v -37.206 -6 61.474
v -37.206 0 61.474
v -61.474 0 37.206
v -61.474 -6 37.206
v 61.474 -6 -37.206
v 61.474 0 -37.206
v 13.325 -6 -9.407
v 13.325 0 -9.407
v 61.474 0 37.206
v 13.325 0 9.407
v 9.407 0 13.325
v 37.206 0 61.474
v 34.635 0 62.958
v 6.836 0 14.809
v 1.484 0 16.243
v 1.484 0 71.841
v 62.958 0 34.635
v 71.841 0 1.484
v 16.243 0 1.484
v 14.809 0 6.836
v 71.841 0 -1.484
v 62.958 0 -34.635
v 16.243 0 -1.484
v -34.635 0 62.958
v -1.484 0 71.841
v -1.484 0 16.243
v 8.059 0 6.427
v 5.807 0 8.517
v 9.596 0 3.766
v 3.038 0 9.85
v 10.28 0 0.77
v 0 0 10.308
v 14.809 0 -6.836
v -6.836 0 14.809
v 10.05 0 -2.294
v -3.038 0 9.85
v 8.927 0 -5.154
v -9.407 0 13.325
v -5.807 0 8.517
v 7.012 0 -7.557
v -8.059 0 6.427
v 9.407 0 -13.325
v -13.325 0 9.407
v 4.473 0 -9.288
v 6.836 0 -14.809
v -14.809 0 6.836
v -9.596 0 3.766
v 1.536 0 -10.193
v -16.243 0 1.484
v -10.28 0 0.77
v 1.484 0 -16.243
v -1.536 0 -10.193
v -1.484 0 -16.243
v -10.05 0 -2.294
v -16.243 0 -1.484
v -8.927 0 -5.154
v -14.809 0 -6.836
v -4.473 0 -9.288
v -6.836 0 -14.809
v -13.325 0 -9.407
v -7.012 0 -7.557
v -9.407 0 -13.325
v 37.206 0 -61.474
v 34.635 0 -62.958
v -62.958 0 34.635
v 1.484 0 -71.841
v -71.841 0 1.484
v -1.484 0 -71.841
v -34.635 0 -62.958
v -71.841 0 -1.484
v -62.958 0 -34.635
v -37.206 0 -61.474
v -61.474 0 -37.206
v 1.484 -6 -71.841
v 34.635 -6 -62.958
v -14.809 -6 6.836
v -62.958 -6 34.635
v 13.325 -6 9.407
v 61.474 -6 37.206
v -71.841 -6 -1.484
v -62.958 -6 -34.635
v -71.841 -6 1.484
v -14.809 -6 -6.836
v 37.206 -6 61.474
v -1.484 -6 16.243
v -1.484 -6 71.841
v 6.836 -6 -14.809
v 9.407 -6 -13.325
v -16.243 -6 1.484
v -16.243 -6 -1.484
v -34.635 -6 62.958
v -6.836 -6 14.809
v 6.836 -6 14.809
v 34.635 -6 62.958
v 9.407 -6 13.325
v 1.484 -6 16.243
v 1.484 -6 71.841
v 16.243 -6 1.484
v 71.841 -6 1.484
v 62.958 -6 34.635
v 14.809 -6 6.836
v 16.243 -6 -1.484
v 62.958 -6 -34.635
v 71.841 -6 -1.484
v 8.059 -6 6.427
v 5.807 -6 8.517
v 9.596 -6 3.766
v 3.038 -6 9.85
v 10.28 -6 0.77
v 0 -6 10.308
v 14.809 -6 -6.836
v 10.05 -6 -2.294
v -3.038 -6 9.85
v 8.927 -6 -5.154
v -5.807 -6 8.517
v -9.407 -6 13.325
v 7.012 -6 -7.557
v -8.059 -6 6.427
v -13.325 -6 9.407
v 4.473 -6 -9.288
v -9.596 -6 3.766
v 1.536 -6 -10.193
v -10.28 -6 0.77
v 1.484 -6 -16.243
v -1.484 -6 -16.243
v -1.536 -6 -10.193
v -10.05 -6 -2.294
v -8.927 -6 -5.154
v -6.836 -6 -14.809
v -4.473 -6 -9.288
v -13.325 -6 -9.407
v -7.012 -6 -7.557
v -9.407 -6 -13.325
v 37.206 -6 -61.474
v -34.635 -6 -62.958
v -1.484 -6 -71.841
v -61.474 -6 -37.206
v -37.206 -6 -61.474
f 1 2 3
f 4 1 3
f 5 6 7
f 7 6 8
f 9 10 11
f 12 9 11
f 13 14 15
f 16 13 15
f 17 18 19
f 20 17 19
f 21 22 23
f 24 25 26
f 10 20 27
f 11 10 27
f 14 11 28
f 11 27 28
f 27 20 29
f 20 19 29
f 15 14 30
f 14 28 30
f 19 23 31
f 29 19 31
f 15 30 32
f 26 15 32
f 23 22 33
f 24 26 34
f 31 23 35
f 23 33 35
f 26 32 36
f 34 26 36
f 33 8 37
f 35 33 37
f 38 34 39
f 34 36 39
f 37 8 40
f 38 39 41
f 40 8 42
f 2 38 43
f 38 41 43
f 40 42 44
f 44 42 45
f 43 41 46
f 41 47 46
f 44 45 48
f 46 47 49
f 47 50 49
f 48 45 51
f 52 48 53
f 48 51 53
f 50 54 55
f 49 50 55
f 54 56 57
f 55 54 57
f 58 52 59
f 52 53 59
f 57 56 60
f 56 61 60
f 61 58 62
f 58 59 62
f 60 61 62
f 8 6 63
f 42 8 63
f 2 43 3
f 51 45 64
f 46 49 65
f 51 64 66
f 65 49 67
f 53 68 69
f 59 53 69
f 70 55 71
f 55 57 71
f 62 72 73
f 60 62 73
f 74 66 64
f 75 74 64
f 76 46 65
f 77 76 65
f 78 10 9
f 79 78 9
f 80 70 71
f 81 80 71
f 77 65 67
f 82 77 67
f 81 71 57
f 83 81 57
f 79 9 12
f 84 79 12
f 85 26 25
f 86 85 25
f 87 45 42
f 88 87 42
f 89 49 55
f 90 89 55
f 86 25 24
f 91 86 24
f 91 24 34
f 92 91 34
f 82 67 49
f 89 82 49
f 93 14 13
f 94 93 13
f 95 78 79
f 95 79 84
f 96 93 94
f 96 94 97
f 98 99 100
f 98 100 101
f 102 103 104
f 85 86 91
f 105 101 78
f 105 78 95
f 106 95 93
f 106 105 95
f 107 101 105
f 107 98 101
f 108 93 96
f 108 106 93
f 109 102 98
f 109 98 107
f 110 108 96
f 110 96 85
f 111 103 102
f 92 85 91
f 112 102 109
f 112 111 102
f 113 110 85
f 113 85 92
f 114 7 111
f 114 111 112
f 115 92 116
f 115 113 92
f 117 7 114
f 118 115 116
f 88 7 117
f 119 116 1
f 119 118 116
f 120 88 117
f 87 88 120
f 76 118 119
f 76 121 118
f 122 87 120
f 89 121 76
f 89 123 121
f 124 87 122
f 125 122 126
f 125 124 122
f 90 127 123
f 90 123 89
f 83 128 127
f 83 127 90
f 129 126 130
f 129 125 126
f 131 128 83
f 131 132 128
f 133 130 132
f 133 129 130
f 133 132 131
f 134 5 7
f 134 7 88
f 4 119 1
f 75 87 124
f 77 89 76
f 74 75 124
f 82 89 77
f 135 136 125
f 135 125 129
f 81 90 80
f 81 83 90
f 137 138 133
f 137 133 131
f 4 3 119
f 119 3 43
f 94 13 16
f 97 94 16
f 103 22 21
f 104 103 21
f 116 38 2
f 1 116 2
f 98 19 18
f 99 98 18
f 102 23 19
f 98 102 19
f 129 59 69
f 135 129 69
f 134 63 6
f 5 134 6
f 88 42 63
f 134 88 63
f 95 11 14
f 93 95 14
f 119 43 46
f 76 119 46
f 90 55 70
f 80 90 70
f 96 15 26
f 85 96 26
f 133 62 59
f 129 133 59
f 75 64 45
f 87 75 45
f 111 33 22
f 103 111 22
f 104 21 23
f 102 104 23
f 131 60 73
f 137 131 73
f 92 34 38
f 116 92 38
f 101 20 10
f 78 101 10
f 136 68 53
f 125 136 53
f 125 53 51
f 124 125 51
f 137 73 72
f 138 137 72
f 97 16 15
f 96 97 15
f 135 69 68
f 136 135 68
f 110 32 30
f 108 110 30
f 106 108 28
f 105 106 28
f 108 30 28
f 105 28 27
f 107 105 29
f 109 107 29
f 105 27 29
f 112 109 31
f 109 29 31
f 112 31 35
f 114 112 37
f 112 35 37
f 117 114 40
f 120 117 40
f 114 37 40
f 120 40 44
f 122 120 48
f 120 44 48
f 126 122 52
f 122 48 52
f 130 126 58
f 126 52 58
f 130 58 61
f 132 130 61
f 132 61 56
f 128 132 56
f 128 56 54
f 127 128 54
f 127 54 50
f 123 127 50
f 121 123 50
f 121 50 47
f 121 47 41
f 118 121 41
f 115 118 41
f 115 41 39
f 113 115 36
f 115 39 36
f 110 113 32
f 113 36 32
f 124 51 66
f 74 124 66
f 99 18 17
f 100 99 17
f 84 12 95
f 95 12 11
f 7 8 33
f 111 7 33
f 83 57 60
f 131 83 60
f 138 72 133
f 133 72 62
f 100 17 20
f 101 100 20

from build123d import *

# Parameters (mm, degrees)
SKETCH1_R           = 10.308435719
BOSS_EXTRUDE1_DEPTH = 6


with BuildPart() as part:
    # Sketch1 → Boss-Extrude1 (new body)
    with BuildSketch(Plane(origin=(0, 0, 0), x_dir=(1, 0, 0), z_dir=(0, 1, 0))):
        Polygon((9.406647228, 13.324720403), (37.205859161, 61.474367881), (61.474367881, 37.205859161), (13.324720403, 9.406647228), (14.808755665, 6.836222753), (62.958403143, 34.635434686), (71.841293847, 1.484035262), (16.242869981, 1.484035262), (16.242869981, -1.484035262), (71.841293847, -1.484035262), (62.958403143, -34.635434686), (14.808755665, -6.836222753), (13.324720403, -9.406647228), (61.474367881, -37.205859161), (37.205859161, -61.474367881), (9.406647228, -13.324720403), (6.836222753, -14.808755665), (34.635434686, -62.958403143), (1.484035262, -71.841293847), (1.484035262, -16.242869981), (-1.484035262, -16.242869981), (-1.484035262, -71.841293847), (-34.635434686, -62.958403143), (-6.836222753, -14.808755665), (-9.406647228, -13.324720403), (-37.205859161, -61.474367881), (-61.474367881, -37.205859161), (-13.324720403, -9.406647228), (-14.808755665, -6.836222753), (-62.958403143, -34.635434686), (-71.841293847, -1.484035262), (-16.242869981, -1.484035262), (-16.242869981, 1.484035262), (-71.841293847, 1.484035262), (-62.958403143, 34.635434686), (-14.808755665, 6.836222753), (-13.324720403, 9.406647228), (-61.474367881, 37.205859161), (-37.205859161, 61.474367881), (-9.406647228, 13.324720403), (-6.836222753, 14.808755665), (-34.635434686, 62.958403143), (-1.484035262, 71.841293847), (-1.484035262, 16.242869981), (1.484035262, 16.242869981), (1.484035262, 71.841293847), (34.635434686, 62.958403143), (6.836222753, 14.808755665), align=None)
        Circle(SKETCH1_R, mode=Mode.SUBTRACT)
    extrude(amount=-BOSS_EXTRUDE1_DEPTH)


solid = part.part
